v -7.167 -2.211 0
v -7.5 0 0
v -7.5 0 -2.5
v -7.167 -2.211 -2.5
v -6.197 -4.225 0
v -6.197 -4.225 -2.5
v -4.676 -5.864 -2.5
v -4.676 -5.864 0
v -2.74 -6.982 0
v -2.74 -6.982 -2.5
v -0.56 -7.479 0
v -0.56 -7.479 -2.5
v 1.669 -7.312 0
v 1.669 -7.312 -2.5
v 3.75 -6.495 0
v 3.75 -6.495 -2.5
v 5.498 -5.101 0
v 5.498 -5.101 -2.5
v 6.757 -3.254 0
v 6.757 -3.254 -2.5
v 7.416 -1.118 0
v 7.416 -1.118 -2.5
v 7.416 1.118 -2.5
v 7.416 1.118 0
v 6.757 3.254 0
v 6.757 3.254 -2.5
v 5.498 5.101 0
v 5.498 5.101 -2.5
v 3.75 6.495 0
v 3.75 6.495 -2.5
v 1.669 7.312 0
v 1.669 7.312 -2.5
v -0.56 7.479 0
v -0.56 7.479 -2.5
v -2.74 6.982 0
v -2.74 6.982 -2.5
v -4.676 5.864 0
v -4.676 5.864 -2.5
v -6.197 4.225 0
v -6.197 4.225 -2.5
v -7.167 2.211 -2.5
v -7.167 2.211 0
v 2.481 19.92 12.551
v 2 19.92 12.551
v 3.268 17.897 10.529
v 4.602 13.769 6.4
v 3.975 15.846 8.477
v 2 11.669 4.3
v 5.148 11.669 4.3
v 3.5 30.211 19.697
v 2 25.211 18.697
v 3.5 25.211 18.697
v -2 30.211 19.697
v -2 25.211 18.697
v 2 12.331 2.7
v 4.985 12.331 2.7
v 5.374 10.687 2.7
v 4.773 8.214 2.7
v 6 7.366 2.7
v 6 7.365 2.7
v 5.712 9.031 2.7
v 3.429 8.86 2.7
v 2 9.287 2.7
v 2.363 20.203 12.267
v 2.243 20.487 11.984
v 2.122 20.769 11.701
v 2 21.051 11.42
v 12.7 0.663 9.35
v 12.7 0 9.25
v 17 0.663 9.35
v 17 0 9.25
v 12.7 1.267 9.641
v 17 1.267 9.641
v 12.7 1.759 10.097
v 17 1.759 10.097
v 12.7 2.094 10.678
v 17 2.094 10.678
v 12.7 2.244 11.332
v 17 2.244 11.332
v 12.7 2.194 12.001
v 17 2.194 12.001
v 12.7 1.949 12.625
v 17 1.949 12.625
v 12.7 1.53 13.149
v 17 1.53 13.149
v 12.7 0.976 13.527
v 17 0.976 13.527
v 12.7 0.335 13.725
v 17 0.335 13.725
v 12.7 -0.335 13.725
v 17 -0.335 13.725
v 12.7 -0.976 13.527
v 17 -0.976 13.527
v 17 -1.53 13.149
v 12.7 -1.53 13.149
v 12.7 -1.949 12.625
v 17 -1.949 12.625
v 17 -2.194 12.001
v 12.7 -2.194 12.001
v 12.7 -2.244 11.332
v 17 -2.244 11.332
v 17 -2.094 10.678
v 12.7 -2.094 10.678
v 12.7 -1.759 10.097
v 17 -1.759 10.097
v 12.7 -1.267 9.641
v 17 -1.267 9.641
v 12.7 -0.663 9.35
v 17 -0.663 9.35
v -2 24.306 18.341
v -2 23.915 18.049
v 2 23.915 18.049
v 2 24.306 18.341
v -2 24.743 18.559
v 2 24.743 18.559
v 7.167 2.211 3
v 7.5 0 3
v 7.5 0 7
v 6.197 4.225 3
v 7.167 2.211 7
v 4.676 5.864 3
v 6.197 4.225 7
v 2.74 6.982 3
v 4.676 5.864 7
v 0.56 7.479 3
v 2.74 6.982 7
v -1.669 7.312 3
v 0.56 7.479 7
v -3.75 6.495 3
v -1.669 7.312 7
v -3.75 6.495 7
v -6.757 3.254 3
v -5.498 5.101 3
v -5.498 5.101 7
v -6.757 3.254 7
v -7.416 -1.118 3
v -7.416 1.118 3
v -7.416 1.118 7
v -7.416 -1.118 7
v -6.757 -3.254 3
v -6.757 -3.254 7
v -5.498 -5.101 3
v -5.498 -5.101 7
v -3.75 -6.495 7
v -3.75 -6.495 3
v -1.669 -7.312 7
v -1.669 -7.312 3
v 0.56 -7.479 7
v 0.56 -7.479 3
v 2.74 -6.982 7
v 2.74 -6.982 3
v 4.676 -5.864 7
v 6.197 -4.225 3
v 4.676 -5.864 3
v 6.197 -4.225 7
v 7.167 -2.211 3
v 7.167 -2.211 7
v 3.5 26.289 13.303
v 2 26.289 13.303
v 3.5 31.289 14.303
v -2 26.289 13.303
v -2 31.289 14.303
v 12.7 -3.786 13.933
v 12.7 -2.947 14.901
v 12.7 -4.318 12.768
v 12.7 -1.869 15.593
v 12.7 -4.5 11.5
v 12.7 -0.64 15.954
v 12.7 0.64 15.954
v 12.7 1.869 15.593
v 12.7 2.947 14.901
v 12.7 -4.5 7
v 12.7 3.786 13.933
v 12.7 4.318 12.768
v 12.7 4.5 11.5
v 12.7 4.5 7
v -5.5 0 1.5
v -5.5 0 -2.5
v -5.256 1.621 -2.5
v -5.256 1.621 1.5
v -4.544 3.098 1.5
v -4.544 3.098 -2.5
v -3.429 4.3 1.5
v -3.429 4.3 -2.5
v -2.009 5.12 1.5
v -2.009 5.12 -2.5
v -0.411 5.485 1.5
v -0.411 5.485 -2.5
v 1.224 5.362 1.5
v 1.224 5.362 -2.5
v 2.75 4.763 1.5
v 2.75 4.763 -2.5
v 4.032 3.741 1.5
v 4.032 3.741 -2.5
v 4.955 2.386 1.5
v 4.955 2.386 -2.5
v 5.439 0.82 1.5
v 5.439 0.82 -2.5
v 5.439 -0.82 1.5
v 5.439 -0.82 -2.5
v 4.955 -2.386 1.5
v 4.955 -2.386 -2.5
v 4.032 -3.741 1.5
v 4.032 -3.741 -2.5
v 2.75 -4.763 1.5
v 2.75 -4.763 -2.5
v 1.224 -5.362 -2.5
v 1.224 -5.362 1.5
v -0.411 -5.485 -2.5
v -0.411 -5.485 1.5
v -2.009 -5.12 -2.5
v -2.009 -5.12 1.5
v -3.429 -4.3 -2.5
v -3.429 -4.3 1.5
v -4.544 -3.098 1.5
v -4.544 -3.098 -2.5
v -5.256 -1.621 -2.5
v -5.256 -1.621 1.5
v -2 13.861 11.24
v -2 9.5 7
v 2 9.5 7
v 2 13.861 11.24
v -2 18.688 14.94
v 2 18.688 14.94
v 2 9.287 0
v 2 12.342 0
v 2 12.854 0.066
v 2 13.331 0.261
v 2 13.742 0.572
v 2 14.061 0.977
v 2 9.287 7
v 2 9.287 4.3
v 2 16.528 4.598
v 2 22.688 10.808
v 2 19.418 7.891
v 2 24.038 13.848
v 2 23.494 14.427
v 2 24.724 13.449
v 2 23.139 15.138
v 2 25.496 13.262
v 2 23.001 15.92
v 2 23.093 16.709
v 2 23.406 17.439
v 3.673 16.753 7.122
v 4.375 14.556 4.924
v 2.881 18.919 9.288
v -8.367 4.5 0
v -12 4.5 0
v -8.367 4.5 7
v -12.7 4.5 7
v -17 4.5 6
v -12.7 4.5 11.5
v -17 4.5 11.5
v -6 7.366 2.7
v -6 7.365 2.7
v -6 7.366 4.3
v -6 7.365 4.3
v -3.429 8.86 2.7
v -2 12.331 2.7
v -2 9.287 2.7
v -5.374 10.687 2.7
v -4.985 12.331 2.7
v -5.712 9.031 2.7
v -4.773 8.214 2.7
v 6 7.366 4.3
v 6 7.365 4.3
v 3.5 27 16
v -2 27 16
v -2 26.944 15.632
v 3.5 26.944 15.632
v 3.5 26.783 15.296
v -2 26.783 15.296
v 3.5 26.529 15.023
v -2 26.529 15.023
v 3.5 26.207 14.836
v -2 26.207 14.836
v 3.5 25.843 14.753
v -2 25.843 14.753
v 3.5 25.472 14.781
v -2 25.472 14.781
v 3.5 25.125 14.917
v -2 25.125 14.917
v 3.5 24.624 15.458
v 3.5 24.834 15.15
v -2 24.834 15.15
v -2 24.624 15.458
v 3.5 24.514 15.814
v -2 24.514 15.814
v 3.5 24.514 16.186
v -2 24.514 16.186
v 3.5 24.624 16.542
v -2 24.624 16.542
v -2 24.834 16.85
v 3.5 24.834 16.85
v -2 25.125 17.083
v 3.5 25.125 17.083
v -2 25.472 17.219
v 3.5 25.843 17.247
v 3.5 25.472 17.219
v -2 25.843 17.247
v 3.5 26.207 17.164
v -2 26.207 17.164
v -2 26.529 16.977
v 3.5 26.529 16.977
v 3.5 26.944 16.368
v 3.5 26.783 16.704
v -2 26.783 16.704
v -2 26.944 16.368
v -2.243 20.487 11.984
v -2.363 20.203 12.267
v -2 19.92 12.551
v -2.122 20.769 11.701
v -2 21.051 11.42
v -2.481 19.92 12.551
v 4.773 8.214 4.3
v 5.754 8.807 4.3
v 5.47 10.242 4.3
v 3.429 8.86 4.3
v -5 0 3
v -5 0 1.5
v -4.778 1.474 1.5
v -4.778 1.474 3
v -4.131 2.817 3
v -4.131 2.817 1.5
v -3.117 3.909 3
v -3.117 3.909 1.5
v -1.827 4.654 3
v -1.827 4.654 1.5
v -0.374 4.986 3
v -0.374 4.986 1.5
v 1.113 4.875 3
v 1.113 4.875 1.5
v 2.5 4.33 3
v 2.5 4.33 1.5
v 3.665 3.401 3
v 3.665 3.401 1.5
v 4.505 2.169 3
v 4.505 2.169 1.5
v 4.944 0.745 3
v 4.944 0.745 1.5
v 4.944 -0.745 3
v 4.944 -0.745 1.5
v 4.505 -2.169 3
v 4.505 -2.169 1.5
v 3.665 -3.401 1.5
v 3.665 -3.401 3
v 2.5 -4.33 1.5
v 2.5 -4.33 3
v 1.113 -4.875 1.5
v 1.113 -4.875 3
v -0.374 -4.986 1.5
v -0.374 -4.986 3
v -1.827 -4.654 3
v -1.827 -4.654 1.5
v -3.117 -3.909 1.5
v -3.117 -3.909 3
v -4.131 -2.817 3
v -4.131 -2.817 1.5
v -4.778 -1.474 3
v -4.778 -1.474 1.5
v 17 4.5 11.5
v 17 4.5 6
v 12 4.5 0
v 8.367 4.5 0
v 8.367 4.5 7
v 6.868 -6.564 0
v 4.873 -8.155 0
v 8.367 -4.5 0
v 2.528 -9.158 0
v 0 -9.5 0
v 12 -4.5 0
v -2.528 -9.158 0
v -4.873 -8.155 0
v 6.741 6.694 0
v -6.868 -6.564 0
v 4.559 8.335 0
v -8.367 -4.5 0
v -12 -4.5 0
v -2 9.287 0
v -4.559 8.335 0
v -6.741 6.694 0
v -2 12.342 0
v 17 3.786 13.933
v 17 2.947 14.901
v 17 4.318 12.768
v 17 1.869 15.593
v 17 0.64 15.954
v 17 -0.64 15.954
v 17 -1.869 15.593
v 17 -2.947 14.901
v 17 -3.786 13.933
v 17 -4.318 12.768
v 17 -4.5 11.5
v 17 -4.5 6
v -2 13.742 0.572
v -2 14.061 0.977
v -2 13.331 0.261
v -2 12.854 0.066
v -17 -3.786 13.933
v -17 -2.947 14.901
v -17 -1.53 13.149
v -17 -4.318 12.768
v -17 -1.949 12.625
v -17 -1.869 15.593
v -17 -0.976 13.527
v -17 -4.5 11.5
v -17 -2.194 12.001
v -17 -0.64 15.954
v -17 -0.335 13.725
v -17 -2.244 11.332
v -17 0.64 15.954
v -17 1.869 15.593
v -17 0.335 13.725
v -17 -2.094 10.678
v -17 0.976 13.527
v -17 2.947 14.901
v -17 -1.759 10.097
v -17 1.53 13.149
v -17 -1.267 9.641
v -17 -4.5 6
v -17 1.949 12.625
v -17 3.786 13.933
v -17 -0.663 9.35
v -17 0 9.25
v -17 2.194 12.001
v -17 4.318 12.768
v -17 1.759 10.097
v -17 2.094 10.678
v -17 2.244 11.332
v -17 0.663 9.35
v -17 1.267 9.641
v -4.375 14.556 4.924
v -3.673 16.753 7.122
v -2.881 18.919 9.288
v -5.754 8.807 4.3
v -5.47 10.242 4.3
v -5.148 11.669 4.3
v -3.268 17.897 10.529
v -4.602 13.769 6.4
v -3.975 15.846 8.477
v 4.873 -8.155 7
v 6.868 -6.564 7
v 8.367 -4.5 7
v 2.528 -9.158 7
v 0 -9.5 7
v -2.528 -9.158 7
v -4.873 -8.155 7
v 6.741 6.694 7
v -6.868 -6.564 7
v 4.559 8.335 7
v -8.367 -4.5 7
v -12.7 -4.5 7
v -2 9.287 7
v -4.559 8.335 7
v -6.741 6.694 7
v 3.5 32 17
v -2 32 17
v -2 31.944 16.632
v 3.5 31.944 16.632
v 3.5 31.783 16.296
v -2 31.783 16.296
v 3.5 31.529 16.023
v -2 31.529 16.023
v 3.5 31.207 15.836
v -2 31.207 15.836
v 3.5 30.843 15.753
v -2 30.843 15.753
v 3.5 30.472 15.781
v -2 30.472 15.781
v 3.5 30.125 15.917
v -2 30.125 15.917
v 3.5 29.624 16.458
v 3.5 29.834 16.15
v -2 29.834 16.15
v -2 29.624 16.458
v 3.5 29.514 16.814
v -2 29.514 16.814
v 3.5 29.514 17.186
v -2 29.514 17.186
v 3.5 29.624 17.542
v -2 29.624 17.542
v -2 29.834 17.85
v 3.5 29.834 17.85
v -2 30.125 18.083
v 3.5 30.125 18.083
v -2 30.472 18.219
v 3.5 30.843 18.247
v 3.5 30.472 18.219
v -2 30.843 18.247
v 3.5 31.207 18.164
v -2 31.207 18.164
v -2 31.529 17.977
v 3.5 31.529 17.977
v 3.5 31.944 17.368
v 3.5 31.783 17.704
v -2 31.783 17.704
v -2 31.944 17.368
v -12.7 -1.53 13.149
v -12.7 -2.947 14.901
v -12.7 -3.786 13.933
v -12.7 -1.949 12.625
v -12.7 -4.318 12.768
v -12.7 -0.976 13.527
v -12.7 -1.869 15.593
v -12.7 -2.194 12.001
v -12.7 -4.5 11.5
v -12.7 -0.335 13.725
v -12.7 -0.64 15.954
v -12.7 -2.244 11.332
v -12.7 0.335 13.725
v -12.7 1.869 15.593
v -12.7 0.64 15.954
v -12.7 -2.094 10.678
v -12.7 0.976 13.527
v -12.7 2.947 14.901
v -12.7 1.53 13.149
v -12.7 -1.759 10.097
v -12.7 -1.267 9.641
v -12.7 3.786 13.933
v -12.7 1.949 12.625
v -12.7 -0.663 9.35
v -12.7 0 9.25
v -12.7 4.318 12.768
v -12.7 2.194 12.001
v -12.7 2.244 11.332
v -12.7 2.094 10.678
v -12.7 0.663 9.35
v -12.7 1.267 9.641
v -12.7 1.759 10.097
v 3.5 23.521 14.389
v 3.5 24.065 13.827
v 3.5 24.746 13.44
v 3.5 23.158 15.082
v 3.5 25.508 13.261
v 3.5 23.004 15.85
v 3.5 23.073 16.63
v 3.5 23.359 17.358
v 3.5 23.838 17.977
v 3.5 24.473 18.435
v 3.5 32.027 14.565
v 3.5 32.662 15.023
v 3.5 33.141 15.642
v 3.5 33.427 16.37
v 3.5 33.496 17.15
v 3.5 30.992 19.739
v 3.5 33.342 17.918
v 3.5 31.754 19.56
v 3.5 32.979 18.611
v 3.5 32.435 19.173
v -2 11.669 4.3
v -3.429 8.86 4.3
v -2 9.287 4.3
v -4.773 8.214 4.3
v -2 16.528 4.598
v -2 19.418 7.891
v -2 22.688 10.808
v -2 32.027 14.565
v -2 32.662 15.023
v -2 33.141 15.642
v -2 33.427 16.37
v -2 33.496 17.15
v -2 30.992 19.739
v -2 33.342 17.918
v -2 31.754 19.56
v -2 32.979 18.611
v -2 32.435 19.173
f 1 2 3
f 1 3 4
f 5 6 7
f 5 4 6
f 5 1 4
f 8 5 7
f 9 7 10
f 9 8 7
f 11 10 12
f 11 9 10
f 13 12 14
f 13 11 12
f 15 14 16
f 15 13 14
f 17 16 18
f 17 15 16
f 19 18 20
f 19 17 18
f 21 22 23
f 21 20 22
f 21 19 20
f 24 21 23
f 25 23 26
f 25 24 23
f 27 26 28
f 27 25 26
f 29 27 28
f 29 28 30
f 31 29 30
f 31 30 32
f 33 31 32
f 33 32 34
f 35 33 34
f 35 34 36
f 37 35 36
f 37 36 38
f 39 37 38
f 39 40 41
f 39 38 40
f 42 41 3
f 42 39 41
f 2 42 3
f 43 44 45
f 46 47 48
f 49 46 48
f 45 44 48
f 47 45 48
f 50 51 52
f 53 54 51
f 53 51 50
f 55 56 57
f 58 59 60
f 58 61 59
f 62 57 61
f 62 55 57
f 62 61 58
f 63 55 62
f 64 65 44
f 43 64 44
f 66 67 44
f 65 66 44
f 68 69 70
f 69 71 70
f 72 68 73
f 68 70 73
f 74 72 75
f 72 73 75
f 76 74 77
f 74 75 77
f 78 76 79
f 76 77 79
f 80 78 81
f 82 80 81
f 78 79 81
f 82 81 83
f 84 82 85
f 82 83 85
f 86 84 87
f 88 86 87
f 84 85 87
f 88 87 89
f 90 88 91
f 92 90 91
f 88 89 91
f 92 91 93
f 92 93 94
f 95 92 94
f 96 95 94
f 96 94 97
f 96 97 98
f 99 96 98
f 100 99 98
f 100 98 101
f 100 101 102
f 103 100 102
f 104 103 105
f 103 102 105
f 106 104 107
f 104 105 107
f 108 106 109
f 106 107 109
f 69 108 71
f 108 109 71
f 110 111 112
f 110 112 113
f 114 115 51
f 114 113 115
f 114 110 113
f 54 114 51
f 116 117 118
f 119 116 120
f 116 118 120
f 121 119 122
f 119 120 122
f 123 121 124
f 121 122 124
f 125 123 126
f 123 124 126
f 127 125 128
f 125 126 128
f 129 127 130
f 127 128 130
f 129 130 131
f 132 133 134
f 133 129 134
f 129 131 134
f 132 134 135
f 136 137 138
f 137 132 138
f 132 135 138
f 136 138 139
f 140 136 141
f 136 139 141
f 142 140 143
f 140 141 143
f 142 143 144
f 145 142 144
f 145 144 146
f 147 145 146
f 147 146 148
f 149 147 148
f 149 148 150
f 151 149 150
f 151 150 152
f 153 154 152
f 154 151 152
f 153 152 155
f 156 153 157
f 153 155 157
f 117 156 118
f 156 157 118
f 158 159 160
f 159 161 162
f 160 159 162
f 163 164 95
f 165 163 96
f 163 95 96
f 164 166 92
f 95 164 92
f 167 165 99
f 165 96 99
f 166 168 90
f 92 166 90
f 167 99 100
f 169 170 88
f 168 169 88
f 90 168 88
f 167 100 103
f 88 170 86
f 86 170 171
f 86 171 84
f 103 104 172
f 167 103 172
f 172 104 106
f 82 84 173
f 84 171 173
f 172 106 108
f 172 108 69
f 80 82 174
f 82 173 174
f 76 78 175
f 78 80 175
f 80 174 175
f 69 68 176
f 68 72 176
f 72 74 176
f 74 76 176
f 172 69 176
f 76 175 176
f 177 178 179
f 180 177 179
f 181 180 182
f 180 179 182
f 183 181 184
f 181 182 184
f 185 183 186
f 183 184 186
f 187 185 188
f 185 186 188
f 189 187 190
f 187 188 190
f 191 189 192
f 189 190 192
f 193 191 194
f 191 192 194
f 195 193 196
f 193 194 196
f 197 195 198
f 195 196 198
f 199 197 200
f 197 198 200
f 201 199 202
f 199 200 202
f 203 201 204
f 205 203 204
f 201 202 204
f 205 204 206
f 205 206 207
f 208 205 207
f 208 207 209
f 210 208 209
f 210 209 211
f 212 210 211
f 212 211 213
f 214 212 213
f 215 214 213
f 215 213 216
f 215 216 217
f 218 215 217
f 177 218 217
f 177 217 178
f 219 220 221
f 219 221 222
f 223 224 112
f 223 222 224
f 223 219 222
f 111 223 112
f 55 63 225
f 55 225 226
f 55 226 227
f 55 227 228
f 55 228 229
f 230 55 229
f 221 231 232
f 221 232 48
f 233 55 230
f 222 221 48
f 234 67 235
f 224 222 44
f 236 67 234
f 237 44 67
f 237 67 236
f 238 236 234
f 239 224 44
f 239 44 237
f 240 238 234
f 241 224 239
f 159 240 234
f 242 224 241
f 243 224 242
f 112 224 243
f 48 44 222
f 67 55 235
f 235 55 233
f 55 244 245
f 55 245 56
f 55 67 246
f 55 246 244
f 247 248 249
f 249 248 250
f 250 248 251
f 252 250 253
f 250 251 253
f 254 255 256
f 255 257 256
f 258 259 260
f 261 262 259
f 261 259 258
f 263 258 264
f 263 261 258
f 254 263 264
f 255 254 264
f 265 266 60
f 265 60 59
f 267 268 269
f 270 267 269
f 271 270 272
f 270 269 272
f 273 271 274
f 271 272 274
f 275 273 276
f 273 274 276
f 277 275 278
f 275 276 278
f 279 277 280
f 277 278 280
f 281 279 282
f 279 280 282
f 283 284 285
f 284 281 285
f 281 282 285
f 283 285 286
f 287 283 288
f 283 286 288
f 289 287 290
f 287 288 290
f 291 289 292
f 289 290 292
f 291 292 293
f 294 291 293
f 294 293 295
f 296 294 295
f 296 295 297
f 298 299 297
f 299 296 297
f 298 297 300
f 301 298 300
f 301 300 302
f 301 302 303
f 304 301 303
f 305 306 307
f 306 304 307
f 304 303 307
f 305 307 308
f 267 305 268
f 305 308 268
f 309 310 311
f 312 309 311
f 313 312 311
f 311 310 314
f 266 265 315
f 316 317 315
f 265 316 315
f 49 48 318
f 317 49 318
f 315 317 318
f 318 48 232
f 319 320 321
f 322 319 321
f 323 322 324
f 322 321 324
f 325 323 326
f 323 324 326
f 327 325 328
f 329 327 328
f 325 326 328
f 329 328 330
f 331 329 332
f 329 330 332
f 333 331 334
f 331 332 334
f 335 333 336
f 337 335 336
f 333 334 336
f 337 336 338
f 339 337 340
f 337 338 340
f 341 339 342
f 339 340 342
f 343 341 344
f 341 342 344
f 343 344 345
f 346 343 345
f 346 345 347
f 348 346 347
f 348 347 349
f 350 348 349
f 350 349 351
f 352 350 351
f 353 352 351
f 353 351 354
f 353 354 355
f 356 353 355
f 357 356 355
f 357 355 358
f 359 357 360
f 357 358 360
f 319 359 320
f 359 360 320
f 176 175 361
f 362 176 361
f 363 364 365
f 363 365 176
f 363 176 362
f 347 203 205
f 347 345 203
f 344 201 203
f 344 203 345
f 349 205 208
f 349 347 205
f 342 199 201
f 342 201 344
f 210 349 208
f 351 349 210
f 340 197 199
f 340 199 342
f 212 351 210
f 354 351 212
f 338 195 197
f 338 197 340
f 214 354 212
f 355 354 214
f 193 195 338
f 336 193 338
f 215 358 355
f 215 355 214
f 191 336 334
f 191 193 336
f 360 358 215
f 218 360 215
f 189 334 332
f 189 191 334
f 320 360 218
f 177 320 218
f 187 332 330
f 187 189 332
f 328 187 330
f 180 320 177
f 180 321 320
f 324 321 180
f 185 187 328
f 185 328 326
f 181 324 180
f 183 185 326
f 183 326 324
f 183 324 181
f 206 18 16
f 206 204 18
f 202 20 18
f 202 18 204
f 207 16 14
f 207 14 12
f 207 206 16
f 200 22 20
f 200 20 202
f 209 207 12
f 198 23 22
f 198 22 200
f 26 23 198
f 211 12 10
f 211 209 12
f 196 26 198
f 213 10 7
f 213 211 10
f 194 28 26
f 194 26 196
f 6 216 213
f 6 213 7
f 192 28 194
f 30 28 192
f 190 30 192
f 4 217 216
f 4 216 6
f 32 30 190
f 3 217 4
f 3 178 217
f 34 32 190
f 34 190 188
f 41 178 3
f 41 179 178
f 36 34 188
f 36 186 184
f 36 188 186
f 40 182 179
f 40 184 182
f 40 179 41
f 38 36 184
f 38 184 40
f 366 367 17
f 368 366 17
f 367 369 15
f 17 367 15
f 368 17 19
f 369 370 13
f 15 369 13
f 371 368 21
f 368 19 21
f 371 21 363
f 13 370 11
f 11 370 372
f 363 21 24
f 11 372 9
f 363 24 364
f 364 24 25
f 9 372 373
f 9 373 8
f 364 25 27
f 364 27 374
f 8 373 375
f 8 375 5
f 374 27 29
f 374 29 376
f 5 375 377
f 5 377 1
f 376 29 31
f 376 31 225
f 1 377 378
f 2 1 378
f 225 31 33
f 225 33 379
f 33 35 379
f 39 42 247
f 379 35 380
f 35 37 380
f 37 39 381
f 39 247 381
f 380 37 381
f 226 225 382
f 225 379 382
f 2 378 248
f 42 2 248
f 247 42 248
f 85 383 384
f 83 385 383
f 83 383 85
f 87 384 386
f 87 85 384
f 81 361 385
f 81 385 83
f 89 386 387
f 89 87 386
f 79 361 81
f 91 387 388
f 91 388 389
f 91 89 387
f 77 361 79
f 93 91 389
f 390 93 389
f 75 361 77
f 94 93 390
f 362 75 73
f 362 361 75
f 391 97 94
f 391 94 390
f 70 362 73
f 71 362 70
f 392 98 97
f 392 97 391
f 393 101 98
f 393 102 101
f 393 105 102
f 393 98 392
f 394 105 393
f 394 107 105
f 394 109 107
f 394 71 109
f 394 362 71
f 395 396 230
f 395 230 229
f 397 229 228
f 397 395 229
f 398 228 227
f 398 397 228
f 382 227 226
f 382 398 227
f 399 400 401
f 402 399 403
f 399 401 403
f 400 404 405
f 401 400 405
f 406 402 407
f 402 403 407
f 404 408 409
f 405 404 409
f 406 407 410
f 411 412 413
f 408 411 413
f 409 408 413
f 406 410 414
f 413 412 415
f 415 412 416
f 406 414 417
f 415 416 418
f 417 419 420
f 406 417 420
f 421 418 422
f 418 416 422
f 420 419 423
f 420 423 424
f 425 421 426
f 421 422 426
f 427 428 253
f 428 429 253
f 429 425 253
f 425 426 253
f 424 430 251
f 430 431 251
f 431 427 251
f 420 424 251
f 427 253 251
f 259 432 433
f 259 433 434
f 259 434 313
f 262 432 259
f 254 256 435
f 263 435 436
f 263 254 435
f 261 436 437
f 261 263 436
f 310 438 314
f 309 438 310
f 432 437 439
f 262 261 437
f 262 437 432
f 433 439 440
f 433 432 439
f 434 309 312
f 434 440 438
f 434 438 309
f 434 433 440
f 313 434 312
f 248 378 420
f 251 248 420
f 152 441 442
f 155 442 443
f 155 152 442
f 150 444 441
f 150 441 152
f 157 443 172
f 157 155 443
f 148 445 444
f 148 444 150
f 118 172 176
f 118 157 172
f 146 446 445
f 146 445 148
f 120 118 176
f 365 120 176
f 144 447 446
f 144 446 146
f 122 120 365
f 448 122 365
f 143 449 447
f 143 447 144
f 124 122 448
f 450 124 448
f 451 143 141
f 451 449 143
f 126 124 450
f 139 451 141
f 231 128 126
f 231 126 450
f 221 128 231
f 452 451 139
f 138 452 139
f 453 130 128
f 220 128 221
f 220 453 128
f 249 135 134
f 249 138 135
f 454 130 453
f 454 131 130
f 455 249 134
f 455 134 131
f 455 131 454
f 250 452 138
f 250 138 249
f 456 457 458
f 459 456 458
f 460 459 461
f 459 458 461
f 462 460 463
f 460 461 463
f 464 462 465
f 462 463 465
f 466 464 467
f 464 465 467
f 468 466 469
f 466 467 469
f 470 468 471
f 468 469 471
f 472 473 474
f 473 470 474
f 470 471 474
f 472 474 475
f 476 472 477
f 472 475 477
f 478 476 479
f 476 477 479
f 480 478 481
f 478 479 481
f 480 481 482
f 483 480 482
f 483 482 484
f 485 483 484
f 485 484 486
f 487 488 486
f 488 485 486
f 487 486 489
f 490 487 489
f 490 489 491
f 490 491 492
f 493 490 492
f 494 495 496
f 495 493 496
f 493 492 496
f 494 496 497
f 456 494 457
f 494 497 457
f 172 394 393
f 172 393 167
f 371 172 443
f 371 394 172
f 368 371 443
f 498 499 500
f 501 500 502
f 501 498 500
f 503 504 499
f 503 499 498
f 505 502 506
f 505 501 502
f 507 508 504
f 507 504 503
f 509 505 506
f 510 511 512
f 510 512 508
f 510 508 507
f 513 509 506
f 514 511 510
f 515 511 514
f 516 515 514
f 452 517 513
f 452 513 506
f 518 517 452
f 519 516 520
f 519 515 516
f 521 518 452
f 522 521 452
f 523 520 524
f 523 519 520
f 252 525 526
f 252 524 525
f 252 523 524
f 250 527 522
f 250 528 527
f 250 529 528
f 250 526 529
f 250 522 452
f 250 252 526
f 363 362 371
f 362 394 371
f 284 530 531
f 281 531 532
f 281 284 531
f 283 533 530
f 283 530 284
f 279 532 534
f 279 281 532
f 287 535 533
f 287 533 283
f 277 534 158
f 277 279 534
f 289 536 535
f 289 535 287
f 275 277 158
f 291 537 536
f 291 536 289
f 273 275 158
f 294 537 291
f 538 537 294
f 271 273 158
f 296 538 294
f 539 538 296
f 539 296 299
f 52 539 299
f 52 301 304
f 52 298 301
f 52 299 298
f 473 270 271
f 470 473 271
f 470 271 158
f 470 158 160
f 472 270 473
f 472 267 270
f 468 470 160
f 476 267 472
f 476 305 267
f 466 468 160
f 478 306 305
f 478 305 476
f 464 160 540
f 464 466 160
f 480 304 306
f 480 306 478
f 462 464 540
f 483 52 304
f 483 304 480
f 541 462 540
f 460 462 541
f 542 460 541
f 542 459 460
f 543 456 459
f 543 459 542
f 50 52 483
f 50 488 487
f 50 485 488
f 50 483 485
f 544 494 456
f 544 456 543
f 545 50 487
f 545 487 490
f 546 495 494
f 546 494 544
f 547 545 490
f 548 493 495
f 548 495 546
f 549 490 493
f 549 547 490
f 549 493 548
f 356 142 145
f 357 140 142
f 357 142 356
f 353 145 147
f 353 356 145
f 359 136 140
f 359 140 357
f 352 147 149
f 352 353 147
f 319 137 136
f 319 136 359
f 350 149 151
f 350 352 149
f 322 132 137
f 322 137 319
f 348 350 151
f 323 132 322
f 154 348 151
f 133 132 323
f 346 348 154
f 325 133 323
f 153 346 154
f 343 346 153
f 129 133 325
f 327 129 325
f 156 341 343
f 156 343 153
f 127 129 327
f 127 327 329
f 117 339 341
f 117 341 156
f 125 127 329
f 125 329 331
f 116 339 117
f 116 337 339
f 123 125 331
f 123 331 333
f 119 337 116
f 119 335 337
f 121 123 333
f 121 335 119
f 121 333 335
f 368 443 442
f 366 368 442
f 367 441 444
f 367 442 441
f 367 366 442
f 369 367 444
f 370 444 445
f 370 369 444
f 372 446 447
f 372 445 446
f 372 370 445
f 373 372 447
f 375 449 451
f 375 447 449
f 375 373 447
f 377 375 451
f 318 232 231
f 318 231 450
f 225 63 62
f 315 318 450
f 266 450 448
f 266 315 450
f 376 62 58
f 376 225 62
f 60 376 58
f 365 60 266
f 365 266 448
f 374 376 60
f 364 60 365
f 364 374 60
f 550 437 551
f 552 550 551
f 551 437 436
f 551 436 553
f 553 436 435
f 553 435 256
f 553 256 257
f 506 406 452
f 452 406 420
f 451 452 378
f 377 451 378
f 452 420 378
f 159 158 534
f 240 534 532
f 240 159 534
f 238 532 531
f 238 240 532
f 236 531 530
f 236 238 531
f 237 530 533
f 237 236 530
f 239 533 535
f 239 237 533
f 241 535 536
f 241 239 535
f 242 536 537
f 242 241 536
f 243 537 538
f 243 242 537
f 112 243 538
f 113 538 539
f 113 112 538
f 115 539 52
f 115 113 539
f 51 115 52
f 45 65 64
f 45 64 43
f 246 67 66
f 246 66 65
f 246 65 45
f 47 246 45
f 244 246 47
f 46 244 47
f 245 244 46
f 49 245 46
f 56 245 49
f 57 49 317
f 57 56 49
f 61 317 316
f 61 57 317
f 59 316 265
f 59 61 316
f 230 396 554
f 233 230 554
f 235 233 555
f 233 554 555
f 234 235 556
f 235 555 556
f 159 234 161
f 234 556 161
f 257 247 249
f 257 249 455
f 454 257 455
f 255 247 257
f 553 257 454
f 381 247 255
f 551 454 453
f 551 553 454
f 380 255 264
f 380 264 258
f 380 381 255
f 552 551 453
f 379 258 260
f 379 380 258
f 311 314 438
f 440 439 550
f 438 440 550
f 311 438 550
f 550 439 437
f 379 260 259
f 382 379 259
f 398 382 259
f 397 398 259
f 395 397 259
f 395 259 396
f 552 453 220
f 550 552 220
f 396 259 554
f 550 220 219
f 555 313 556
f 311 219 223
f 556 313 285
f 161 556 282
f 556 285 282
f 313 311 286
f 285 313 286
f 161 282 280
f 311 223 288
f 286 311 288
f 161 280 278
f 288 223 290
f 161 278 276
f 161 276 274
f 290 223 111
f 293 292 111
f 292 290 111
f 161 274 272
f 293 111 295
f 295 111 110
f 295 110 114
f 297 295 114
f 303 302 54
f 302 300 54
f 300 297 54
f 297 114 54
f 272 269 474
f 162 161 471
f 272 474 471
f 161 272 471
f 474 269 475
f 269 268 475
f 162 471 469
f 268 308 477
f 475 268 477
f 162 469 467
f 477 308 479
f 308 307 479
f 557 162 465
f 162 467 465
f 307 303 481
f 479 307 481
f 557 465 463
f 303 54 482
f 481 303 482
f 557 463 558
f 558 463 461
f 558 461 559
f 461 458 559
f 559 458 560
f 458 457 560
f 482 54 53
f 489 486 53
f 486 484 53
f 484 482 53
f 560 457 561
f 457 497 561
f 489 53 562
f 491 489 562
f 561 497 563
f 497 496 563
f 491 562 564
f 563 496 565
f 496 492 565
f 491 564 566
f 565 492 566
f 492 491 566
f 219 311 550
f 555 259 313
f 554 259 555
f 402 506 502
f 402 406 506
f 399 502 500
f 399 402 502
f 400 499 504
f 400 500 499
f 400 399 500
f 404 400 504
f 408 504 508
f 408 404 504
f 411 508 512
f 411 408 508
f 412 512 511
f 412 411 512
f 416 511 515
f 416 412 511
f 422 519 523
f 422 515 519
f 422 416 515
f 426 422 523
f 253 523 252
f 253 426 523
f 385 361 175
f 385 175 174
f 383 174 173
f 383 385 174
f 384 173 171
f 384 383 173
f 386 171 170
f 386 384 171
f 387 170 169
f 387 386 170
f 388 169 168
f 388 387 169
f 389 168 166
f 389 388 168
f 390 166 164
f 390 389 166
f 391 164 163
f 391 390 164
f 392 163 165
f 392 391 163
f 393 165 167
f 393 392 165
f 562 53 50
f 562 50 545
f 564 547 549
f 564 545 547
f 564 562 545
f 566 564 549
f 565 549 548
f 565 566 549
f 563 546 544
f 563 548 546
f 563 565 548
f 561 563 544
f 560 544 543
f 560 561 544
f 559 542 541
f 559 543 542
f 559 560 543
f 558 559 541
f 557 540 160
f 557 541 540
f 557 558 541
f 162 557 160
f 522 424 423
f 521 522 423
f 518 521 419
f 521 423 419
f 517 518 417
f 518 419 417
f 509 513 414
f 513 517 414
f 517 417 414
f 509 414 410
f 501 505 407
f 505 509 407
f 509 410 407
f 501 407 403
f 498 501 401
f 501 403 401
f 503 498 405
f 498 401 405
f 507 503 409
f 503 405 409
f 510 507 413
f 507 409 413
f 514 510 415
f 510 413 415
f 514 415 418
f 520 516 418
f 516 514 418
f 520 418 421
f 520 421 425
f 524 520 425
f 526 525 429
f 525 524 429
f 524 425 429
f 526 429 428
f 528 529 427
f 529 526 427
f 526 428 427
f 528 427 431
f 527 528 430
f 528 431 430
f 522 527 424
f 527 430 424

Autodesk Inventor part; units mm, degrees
ref_plane "YZ Plane" through (0, 0, 0) normal (1, 0, 0) x (0, 1, 0)
ref_plane "XZ Plane" through (0, 0, 0) normal (0, 1, 0) x (-1, 0, 0)
ref_plane "XY Plane" through (0, 0, 0) normal (0, 0, 1) x (1, 0, 0)
sketch "Sketch1" plane through (0, 0, 0) normal (0, 0, 1) x (1, 0, 0)
  line L0 (17, 4.5) -> (17, -4.5)
  line L1 (-17, -4.5) -> (-17, 4.5)
  arc A0 (-8.3666, -4.5) -> (8.3666, -4.5) centre (0, 0) ccw
  arc A1 (8.3666, 4.5) -> (-8.3666, 4.5) centre (0, 0) ccw
  line L2 (-17, 4.5) -> (-8.3666, 4.5)
  line L3 (8.3666, 4.5) -> (17, 4.5)
  line L4 (17, -4.5) -> (8.3666, -4.5)
  line L5 (-8.3666, -4.5) -> (-17, -4.5)
  line L6 (-17, 4.5) -> (17, -4.5) construction
  line L7 (-17, -4.5) -> (17, 4.5) construction
  point P0 (0, 0)
  point P1 (0, 0)
  dimension "d0" = 9
  dimension "d1" = 34
  dimension "d2" = 9.5
  dimension "d3" = 9
  dimension "d4" = 9.5
  dimension "d12" = 4.5
extrude "Extrusion1" add sketch "Sketch1" along normal blind 7
sketch "Sketch2" plane through (17, -4.5, 0) normal (1, 0, 0) x (0, 0, -1)
  arc A0 (-11.5, 9) -> (-11.5, 0) centre (-11.5, 4.5) ccw
  circle A1 centre (-11.5, 4.5) radius 2.25
  line L0 (-7, 9) -> (-11.5, 9)
  line L1 (-11.5, 0) -> (-7, 0)
  line L2 (-7, 0) -> (-7, 9)
  point P0 (0, 4.5)
  point P1 (-7, 0)
  dimension "d7" = 9
  dimension "d8" = 4.5
  dimension "d9" = 9
extrude "Extrusion2" add sketch "Sketch2" against normal blind 4.3
extrude "Extrusion3" add sketch "Sketch2" along normal blind 4.3 from surface at -34
sketch "Sketch3" plane through (-17, -4.5, 0) normal (0, -1, 0) x (1, 0, 0)
  line L0 (0, 6) -> (0, 0)
  line L1 (0, 0) -> (5, 0)
  line L2 (5, 0) -> (0, 6)
  line L3 (29, 0) -> (34, 0)
  line L4 (34, 0) -> (34, 6)
  line L5 (34, 6) -> (29, 0)
  point P0 (17, 0)
  dimension "d15" = 6
  dimension "d16" = 5
  dimension "d17" = 6
  dimension "d18" = 5
extrude "Extrusion4" cut sketch "Sketch3" against normal up to next
sketch "Sketch4" plane through (0, 0, 0) normal (0, 0, -1) x (-1, 0, 0)
  circle A0 centre (0, 0) radius 7.5
  dimension "d21" = 15
extrude "Extrusion5" add sketch "Sketch4" along normal blind 2.5
sketch "Sketch5" plane through (0, 0, 7) normal (0, 0, 1) x (1, 0, 0)
  circle A0 centre (0, 0) radius 7.5
  dimension "d24" = 15
extrude "Extrusion6" cut sketch "Sketch5" against normal blind 4
sketch "Sketch6" plane through (0, 0, -2.5) normal (0, 0, -1) x (-1, 0, 0)
  circle A0 centre (0, 0) radius 5.5
  dimension "d27" = 11
extrude "Extrusion7" cut sketch "Sketch6" against normal blind 4
sketch "Sketch7" plane through (0, 0, 1.5) normal (0, 0, -1) x (-1, 0, 0)
  circle A0 centre (0, 0) radius 5
  dimension "d30" = 10
extrude "Extrusion8" cut sketch "Sketch7" against normal up to next
sketch "Sketch9" plane through (0, 0, 0) normal (1, 0, 0) x (0, 1, 0)
  arc A0 (31.2893, 14.3034) -> (30.2107, 19.6966) centre (30.75, 17) ccw
  line L0 (-9.5504, 0) -> (57.3026, 0) projected
  line L1 (0, -37.6235) -> (0, 29.8791) projected
  circle A1 centre (30.75, 17) radius 1.25
  arc A2 (25.2107, 18.6966) -> (23.9154, 18.0486) centre (25.75, 16) ccw
  circle A3 centre (25.75, 16) radius 1.25
  line L2 (9.5, 7) -> (9.5, 0)
  line L3 (9.5, 0) -> (12.3425, 0)
  line L4 (25.2107, 18.6966) -> (30.2107, 19.6966)
  line L5 (26.2893, 13.3034) -> (31.2893, 14.3034)
  arc A4 (23.9154, 18.0486) -> (9.5, 7) centre (47.7522, -27.9802) ccw
  arc A5 (26.2893, 13.3034) -> (14.061, 0.9769) centre (44.8843, -17.3723) ccw
  arc A6 (12.3425, 0) -> (14.061, 0.9769) centre (12.3425, 2) ccw
  line L6 (8.5, 7) -> (9.5, 7)
  line L7 (9.5, 7) -> (9.5, 0)
  line L8 (9.5, 0) -> (8.5, 0)
  line L9 (8.5, 0) -> (8.5, 7)
  point P0 (0, 0)
  point P1 (13.5, 0)
  dimension "d53" = 5.5
  dimension "d54" = 17
  dimension "d55" = 30.75
  dimension "d56" = 2.5
  dimension "d57" = 16
  dimension "d58" = 25.75
  dimension "d59" = 4
  dimension "d60" = 7
  dimension "d61" = 9.5
  dimension "d62" = 0
  dimension "d63" = 51.8348
  dimension "d64" = 35.8716
  dimension "d65" = 2
  dimension "d88" = 7
  dimension "d89" = 1
  dimension "d90" = 0
  dimension "d91" = 0
extrude "Extrusion9" add sketch "Sketch9" along normal mid plane 4 contours L5 A5 A6 L0 L2 A4 A2 L4 A0
sketch "Sketch10" plane through (0, 0, 0) normal (1, 0, 0) x (0, 1, 0)
  arc A0 (25.2107, 18.6966) -> (26.2893, 13.3034) centre (25.75, 16) ccw
  circle A1 centre (25.75, 16) radius 1.25 projected
  arc A2 (31.2893, 14.3034) -> (30.2107, 19.6966) centre (30.75, 17) ccw
  circle A3 centre (25.75, 16) radius 1.25
  circle A4 centre (30.75, 17) radius 1.25
  circle A5 centre (30.75, 17) radius 1.25 projected
  line L0 (25.2107, 18.6966) -> (30.2107, 19.6966)
  line L1 (26.2893, 13.3034) -> (31.2893, 14.3034)
  point P0 (0, 0)
  dimension "d68" = 5.5
  dimension "d69" = 2.5
extrude "Extrusion10" add sketch "Sketch10" along normal blind 3.5
sketch "Sketch11" plane through (0, 0, 0) normal (1, 0, 0) x (0, 1, 0)
  line L0 (-4.2102, 0) -> (25.2612, 0) projected
  line L1 (0, -2.5102) -> (0, 15.0612) projected
  line L2 (19.9196, 12.551) -> (11.6686, 4.3)
  line L3 (11.6686, 4.3) -> (0, 4.3)
  line L4 (21.051, 11.4196) -> (12.3314, 2.7)
  line L5 (12.3314, 2.7) -> (0, 2.7)
  line L6 (21.051, 11.4196) -> (19.9196, 12.551)
  line L7 (0, 4.3) -> (0, 2.7)
  point P0 (0, 0)
extrude "Extrusion11" add sketch "Sketch11" along normal mid plane 12
extrude "Extrusion12" cut sketch "Sketch5" against normal blind 4
extrude "Extrusion13" cut sketch "Sketch7" against normal through all
sketch "Sketch12" plane through (0, 0, 0) normal (0, 0, 1) x (1, 0, 0)
  line L0 (6, 7.3655) -> (6, 12.3314) projected
  line L1 (2, 21.051) -> (6, 21.051) projected
  arc A0 (6, 7.3655) -> (2, 21.051) centre (-49.0316, -1.2919) ccw
  line L2 (0, 0) -> (0, 16.5543) construction
  arc A1 (-2, 21.051) -> (-6, 7.3655) centre (49.0316, -1.2919) ccw
  line L3 (2, 14.061) -> (2, 14.061) construction
  line L4 (2, 21.051) -> (6, 21.051)
  line L5 (6, 7.3655) -> (6, 21.051)
  line L6 (-6, 7.3655) -> (-6, 21.051)
  line L7 (-2, 21.051) -> (-6, 21.051)
  point P0 (2, 26.2893)
extrude "Extrusion14" cut sketch "Sketch12" along normal up to next
sketch "Sketch13" plane through (0, 0, 0) normal (1, 0, 0) x (0, 1, 0)
  line L0 (8.5, 7) -> (9.5, 7)
  line L1 (9.5, 7) -> (9.5, 0)
  line L2 (9.5, 0) -> (8.5, 0)
  line L3 (8.5, 0) -> (8.5, 7)
  line L4 (0, -6.95) -> (0, 24.2) projected
  line L5 (-18.1, 0) -> (42.1, 0) projected
  point P0 (0, 0)
  dimension "d92" = 7
  dimension "d93" = 1
  dimension "d94" = 9.5
  dimension "d95" = 0
extrude "Extrusion15" add sketch "Sketch13" along normal mid plane 4
properties part number "RCT-P006_steering_knuckle"
